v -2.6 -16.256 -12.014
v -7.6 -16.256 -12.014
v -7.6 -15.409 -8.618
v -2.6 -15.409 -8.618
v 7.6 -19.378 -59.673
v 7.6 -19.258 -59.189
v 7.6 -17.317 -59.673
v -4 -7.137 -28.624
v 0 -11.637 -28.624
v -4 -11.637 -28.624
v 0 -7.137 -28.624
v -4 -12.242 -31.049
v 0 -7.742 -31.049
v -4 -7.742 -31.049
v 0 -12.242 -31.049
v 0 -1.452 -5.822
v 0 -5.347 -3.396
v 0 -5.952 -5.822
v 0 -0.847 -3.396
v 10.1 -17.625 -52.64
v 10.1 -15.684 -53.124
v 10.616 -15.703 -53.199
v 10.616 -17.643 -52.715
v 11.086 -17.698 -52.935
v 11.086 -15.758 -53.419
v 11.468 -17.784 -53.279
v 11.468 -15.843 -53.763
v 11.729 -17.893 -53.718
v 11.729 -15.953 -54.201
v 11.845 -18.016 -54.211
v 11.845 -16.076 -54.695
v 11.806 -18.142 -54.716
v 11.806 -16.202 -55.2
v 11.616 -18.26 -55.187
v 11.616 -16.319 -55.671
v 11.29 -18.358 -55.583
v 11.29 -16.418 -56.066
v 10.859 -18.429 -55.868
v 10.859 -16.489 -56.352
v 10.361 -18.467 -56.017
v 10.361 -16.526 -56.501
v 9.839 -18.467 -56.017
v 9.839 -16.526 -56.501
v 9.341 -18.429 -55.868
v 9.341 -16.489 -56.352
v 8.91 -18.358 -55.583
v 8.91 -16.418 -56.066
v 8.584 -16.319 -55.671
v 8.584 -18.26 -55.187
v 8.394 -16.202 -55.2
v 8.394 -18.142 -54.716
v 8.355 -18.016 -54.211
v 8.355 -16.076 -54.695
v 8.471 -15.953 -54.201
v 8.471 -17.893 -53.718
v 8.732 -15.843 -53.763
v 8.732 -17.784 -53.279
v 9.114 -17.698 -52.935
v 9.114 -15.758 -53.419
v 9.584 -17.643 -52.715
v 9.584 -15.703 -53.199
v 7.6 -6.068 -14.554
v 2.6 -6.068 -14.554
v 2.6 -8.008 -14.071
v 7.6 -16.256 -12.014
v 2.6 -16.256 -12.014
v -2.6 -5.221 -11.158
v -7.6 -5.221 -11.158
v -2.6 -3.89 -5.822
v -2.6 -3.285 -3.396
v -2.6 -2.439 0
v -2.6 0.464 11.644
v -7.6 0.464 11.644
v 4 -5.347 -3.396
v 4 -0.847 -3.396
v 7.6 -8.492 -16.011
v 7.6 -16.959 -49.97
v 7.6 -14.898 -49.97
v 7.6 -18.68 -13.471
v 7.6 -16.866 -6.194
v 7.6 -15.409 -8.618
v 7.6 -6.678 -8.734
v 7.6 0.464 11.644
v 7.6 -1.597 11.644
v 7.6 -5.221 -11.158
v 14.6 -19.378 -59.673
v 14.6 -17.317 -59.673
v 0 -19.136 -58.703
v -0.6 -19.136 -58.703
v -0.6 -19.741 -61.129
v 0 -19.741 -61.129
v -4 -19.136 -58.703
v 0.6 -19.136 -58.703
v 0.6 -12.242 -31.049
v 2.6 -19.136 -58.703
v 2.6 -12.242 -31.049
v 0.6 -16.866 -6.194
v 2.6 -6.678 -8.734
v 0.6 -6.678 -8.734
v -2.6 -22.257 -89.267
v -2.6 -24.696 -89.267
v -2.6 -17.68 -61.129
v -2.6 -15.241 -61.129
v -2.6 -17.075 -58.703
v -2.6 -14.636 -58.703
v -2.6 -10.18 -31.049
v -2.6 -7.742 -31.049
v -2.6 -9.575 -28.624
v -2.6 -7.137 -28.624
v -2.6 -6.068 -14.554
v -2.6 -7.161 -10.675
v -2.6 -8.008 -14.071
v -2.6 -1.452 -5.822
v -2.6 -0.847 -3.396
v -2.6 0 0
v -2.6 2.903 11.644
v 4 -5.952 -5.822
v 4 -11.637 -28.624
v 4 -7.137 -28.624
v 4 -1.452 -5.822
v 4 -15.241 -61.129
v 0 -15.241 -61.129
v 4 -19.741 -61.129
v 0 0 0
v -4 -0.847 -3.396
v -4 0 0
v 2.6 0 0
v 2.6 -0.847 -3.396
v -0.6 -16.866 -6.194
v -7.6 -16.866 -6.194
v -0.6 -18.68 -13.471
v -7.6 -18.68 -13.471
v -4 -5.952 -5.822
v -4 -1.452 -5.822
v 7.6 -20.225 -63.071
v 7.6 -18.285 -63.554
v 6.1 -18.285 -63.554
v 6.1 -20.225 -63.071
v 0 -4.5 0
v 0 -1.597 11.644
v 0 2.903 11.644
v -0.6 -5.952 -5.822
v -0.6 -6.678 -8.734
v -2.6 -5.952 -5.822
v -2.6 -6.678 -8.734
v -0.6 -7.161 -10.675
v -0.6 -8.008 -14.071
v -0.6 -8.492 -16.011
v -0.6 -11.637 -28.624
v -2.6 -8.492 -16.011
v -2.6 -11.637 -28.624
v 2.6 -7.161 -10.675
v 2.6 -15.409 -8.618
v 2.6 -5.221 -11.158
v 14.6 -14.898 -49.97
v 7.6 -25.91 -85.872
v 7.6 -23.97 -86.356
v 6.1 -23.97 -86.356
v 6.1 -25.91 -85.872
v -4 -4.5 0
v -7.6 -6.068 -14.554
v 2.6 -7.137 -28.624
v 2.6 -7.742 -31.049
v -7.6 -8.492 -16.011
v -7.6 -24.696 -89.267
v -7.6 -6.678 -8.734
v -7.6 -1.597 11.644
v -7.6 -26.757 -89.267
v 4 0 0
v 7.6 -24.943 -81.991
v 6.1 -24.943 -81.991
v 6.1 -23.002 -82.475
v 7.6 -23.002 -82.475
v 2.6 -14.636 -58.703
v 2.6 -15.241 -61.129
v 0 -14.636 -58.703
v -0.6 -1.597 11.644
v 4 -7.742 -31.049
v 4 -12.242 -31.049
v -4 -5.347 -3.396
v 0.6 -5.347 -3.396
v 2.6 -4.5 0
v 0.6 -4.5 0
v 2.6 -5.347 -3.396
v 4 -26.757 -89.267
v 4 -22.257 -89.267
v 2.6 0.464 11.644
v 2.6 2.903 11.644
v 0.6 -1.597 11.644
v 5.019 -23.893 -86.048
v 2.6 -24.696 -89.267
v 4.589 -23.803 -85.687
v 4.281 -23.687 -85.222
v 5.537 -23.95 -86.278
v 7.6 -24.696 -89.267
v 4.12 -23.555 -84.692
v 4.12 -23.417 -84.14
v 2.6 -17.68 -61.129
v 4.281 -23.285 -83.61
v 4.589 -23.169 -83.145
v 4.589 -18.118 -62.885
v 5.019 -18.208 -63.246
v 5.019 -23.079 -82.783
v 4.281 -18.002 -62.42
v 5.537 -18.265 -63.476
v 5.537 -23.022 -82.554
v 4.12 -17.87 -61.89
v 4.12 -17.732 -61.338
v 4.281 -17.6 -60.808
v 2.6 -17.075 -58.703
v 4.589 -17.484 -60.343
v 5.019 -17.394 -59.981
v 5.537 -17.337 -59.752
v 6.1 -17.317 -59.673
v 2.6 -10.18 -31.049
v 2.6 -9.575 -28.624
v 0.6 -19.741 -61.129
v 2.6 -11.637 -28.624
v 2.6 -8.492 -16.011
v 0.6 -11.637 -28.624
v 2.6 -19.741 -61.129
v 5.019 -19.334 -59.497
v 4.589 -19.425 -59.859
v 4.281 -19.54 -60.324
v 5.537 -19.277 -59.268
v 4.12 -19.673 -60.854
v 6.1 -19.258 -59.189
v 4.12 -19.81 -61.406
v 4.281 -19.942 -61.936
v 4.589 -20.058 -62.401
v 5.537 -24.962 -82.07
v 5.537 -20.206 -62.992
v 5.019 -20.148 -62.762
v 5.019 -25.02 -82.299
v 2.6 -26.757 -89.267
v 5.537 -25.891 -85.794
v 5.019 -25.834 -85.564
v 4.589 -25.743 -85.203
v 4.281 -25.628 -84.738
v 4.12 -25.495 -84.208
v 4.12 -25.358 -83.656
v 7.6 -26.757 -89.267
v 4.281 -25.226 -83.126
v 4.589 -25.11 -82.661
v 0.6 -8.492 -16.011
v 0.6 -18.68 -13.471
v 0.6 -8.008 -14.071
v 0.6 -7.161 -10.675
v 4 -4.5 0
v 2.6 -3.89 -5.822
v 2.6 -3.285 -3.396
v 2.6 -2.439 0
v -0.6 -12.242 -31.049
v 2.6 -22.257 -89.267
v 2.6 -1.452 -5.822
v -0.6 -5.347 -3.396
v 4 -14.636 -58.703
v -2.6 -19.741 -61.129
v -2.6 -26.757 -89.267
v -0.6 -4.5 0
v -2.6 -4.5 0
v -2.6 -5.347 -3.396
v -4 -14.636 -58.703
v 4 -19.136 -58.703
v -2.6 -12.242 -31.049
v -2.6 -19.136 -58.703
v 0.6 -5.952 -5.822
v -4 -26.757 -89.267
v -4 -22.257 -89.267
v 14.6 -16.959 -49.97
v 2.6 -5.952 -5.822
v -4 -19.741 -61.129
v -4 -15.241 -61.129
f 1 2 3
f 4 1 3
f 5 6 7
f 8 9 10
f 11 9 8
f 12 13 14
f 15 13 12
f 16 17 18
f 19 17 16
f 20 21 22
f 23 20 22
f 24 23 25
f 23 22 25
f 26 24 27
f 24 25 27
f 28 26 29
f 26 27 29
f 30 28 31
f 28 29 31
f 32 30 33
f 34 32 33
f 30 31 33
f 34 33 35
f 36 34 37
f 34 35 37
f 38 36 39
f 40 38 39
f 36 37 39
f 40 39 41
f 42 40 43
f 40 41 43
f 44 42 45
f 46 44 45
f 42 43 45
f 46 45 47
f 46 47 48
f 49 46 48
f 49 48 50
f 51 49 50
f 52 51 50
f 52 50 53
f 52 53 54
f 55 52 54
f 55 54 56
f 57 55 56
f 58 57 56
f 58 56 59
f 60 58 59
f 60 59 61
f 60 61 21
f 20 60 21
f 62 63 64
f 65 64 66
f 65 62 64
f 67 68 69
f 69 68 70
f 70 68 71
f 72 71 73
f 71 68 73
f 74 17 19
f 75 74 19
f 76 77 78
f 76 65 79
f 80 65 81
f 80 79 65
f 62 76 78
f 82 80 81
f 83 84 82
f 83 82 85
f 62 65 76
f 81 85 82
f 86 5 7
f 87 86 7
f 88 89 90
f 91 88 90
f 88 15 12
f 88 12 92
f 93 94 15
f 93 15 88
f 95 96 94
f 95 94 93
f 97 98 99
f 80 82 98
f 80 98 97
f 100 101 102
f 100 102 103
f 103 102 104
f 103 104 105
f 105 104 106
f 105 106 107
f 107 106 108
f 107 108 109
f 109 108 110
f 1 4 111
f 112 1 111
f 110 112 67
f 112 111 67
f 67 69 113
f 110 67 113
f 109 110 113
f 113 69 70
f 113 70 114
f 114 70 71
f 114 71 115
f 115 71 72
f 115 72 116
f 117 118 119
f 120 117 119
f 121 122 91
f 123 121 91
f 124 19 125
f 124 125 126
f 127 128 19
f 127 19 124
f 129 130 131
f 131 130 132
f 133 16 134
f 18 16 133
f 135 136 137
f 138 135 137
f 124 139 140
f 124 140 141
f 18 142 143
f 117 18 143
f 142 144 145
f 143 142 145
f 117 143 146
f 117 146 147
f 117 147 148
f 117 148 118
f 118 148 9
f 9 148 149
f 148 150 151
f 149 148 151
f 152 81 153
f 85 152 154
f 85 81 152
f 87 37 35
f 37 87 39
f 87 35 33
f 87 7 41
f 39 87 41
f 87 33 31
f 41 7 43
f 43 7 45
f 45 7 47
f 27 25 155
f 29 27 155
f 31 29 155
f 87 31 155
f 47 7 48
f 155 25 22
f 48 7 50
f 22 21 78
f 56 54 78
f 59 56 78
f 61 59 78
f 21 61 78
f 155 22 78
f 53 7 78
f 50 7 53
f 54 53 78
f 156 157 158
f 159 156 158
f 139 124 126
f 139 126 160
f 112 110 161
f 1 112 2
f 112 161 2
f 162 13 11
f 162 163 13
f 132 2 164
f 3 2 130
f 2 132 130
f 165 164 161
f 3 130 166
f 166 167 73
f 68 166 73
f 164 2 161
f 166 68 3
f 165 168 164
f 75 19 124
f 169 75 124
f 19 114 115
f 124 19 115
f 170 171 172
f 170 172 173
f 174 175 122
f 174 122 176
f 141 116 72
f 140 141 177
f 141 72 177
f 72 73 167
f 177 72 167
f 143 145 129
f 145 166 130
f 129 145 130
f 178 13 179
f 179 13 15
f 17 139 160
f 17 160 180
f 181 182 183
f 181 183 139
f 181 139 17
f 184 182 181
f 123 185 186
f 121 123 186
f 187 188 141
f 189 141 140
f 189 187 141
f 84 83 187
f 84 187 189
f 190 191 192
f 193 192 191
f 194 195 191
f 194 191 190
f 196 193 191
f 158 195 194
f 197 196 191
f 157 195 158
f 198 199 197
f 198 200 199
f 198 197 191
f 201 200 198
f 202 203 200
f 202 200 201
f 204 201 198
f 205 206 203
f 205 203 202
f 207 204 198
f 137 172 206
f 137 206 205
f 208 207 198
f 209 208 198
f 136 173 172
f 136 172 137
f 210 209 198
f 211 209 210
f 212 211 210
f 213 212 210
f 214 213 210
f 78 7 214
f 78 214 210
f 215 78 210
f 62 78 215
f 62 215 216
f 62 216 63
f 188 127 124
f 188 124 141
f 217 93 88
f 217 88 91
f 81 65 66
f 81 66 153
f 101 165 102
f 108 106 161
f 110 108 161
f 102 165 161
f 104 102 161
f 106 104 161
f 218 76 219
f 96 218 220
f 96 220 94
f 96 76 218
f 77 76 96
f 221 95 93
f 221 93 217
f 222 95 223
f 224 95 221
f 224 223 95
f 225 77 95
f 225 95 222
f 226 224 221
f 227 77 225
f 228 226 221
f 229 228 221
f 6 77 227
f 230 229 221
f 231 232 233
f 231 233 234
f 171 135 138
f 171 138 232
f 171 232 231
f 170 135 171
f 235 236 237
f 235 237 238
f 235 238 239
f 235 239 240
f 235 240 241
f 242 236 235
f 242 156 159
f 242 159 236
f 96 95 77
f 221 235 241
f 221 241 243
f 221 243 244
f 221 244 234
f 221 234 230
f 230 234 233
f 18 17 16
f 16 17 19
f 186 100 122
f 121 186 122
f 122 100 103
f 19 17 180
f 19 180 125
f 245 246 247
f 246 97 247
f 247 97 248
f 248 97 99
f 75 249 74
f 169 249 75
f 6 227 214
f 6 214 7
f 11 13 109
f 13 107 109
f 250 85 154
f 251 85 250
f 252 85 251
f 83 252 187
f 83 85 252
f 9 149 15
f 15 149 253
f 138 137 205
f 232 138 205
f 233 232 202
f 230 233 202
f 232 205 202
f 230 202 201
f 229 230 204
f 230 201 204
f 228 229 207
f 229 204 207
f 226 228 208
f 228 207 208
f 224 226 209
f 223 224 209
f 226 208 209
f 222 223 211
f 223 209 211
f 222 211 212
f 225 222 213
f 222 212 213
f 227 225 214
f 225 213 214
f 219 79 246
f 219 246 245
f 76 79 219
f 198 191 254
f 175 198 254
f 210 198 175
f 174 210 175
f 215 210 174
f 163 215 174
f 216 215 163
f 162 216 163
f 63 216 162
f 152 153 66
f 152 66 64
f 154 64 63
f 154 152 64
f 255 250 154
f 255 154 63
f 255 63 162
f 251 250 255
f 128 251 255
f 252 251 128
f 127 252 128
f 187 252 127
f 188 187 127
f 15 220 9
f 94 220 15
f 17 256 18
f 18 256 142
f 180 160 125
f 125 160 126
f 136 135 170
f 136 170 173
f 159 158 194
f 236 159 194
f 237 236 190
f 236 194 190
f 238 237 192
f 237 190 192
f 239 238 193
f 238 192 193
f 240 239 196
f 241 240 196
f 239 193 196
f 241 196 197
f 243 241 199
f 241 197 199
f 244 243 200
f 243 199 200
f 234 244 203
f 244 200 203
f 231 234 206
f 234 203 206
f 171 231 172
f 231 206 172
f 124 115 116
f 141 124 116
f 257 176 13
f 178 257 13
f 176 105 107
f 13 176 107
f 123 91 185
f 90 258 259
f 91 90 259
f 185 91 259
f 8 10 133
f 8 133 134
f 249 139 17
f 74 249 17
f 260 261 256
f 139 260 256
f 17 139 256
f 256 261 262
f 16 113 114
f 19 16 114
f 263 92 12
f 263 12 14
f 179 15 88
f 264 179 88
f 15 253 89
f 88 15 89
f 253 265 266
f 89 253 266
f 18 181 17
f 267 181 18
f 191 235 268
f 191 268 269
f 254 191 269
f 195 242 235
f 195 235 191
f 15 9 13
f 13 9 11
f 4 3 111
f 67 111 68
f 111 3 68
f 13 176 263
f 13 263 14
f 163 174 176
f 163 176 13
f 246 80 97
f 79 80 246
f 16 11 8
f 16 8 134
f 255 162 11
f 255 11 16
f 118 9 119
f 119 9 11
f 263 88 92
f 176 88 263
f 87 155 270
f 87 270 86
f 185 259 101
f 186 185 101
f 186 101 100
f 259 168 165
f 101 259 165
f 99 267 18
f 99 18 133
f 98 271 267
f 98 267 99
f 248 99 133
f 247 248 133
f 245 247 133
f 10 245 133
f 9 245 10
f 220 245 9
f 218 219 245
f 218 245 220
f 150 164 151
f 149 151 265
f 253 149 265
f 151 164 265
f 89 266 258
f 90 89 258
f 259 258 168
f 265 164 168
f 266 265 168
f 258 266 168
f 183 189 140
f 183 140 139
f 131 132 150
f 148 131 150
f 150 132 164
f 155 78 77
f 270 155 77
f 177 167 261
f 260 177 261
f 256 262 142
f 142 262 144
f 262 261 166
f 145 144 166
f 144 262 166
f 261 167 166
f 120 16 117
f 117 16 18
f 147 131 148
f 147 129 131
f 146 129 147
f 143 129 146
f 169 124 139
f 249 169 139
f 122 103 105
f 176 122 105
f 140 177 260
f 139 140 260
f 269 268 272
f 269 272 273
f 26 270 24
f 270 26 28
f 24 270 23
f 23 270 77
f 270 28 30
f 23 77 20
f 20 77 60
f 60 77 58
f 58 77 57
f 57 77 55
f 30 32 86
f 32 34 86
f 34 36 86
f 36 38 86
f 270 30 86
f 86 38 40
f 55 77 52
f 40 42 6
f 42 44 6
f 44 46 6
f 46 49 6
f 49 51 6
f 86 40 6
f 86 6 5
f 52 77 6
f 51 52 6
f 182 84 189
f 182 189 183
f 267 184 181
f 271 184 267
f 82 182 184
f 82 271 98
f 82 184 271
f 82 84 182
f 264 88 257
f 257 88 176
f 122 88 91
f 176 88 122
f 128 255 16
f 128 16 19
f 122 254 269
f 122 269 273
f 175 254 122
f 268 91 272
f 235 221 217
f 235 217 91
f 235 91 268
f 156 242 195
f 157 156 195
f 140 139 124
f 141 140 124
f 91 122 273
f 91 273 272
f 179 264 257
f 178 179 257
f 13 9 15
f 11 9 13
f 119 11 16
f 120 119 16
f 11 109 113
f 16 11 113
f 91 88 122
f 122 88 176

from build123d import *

# Parameters (mm, degrees)
LEFT_START                   = -2.6
LEFT_SIDE_FOR_MIRROR_DEPTH   = 6.6
LEFT_START_2                 = -7.6
LEFT_SIDE_FOR_MIRROR_2_DEPTH = 7
LEFT_SIDE_FOR_MIRROR_3_DEPTH = 2
LEFT_START_3                 = -0.6
LEFT_SIDE_FOR_MIRROR_4_DEPTH = 0.6
BOSS_EXTRUDE1_DEPTH          = 7
SKETCH3_R                    = 1.75
CUT_EXTRUDE1_DEPTH           = 7
CUT_EXTRUDE2_DEPTH           = 7


# Read off the part's stored shape, not the designer's step: Left side (for mirror)
with BuildPart() as part:
    # Left side (for mirror) outline → Left side (for mirror) (new body)
    with BuildSketch(Plane.YZ.offset(LEFT_START)):
        Polygon((-19.741079423, -61.128630755), (-26.756814395, -89.267206817), (-22.256814395, -89.267206817), (-15.241079423, -61.128630755), align=None)
        Polygon((-12.241500659, -31.049463241), (-19.136274684, -58.70289144), (-14.636274684, -58.70289144), (-7.741500659, -31.049463241), align=None)
        Polygon((-11.63669592, -28.623723925), (-7.13669592, -28.623723925), (-1.451531374, -5.821774358), (-5.951531374, -5.821774358), align=None)
        Polygon((-0.846726635, -3.396035042), (0, 0), (-4.5, 0), (-5.346726635, -3.396035042), align=None)
    extrude(amount=LEFT_SIDE_FOR_MIRROR_DEPTH)

    # Left side _for mirror 2 outline → Left side _for mirror 2 (add)
    with BuildSketch(Plane.YZ.offset(LEFT_START_2)):
        Polygon((-26.756814395, -89.267206817), (-24.695587136, -89.267206817), (-6.067601175, -14.554435894), (-16.255706301, -12.01425599), (-15.408979667, -8.618220948), (-5.220874541, -11.158400852), (0.464290006, 11.643548715), (-1.596937253, 11.643548715), (-6.677622202, -8.733965608), (-16.865727328, -6.193785705), (-18.680141545, -13.471003652), (-8.492036419, -16.011183555), align=None)
    extrude(amount=LEFT_SIDE_FOR_MIRROR_2_DEPTH)



with BuildPart() as body_2:
    # Left side _for mirror 3 outline → Left side _for mirror 3 (new body)
    with BuildSketch(Plane.YZ.offset(LEFT_START)):
        Polygon((-17.075047425, -58.70289144), (-17.679852164, -61.128630755), (-15.241079423, -61.128630755), (-14.636274684, -58.70289144), align=None)
        Polygon((-9.575468661, -28.623723925), (-10.1802734, -31.049463241), (-7.741500659, -31.049463241), (-7.13669592, -28.623723925), align=None)
        Polygon((-16.255706301, -12.01425599), (-8.008192628, -14.070592103), (-7.161465993, -10.674557061), (-15.408979667, -8.618220948), align=None)
        Polygon((-3.890304115, -5.821774358), (-1.451531374, -5.821774358), (-0.846726635, -3.396035042), (-3.285499376, -3.396035042), align=None)
        Polygon((-2.438772741, 0), (0, 0), (2.903062747, 11.643548715), (0.464290006, 11.643548715), align=None)
    extrude(amount=LEFT_SIDE_FOR_MIRROR_3_DEPTH)


with BuildPart() as part_1:
    add(part.part)

    add(body_2.part)  # Left side _for mirror 4 merges body 2
    # Left side _for mirror 4 outline → Left side _for mirror 4 (add)
    with BuildSketch(Plane.YZ.offset(LEFT_START_3)):
        Polygon((-19.136274684, -58.70289144), (-19.741079423, -61.128630755), (-15.241079423, -61.128630755), (-14.636274684, -58.70289144), align=None)
        Polygon((-11.63669592, -28.623723925), (-12.241500659, -31.049463241), (-7.741500659, -31.049463241), (-7.13669592, -28.623723925), align=None)
        Polygon((-1.451531374, -5.821774358), (-0.846726635, -3.396035042), (-5.346726635, -3.396035042), (-5.951531374, -5.821774358), align=None)
        Polygon((0, 0), (2.903062747, 11.643548715), (-1.596937253, 11.643548715), (-4.5, 0), align=None)
    extrude(amount=LEFT_SIDE_FOR_MIRROR_4_DEPTH)


with BuildPart() as body_2_2:
    # Mirror4: mirrored copy
    add(part_1.part.mirror(Plane(origin=(0, 0, 0), x_dir=(0, 0, 1), z_dir=(1, 0, 0))))

    # Sketch2 → Boss-Extrude1 (add)
    with BuildSketch(Plane(origin=(7.6, 0, 0), x_dir=(0, 0, -1), z_dir=(1, 0, 0))):
        Polygon((49.970229903, -14.897750365), (49.970229903, -16.958977623), (59.673187166, -19.378196579), (59.673187166, -17.316969321), align=None)
    extrude(amount=BOSS_EXTRUDE1_DEPTH)

    # Sketch3 → Cut-Extrude1 (cut)
    with BuildSketch(Plane(origin=(0, -2.296040631, 0.572467225), x_dir=(1, 0, 0), z_dir=(0, 0.9702957262759965, -0.24192189559966834))):
        with Locations(Location((10.1, 57.089992525, 0), (0, 0, 270))):
            Circle(SKETCH3_R)
    extrude(amount=-CUT_EXTRUDE1_DEPTH, mode=Mode.SUBTRACT)

    # Sketch5 → Cut-Extrude2 (cut)
    with BuildSketch(Plane(origin=(0, -2.296040631, 0.572467225), x_dir=(1, 0, 0), z_dir=(0, 0.9702957262759965, -0.24192189559966834))):
        with BuildLine():
            Line((6.1, 62.089992525), (7.6, 62.089992525))
            Line((7.6, 62.089992525), (7.6, 66.089992525))
            Line((7.6, 66.089992525), (6.1, 66.089992525))
            ThreePointArc((6.1, 66.089992525), (4.1, 64.089992525), (6.1, 62.089992525))
        make_face()
        with BuildLine():
            Line((6.1, 85.589992525), (7.6, 85.589992525))
            Line((7.6, 85.589992525), (7.6, 89.589992525))
            Line((7.6, 89.589992525), (6.1, 89.589992525))
            ThreePointArc((6.1, 89.589992525), (4.1, 87.589992525), (6.1, 85.589992525))
        make_face()
    extrude(amount=-CUT_EXTRUDE2_DEPTH, mode=Mode.SUBTRACT)


solid = Compound([part_1.part, body_2_2.part])
